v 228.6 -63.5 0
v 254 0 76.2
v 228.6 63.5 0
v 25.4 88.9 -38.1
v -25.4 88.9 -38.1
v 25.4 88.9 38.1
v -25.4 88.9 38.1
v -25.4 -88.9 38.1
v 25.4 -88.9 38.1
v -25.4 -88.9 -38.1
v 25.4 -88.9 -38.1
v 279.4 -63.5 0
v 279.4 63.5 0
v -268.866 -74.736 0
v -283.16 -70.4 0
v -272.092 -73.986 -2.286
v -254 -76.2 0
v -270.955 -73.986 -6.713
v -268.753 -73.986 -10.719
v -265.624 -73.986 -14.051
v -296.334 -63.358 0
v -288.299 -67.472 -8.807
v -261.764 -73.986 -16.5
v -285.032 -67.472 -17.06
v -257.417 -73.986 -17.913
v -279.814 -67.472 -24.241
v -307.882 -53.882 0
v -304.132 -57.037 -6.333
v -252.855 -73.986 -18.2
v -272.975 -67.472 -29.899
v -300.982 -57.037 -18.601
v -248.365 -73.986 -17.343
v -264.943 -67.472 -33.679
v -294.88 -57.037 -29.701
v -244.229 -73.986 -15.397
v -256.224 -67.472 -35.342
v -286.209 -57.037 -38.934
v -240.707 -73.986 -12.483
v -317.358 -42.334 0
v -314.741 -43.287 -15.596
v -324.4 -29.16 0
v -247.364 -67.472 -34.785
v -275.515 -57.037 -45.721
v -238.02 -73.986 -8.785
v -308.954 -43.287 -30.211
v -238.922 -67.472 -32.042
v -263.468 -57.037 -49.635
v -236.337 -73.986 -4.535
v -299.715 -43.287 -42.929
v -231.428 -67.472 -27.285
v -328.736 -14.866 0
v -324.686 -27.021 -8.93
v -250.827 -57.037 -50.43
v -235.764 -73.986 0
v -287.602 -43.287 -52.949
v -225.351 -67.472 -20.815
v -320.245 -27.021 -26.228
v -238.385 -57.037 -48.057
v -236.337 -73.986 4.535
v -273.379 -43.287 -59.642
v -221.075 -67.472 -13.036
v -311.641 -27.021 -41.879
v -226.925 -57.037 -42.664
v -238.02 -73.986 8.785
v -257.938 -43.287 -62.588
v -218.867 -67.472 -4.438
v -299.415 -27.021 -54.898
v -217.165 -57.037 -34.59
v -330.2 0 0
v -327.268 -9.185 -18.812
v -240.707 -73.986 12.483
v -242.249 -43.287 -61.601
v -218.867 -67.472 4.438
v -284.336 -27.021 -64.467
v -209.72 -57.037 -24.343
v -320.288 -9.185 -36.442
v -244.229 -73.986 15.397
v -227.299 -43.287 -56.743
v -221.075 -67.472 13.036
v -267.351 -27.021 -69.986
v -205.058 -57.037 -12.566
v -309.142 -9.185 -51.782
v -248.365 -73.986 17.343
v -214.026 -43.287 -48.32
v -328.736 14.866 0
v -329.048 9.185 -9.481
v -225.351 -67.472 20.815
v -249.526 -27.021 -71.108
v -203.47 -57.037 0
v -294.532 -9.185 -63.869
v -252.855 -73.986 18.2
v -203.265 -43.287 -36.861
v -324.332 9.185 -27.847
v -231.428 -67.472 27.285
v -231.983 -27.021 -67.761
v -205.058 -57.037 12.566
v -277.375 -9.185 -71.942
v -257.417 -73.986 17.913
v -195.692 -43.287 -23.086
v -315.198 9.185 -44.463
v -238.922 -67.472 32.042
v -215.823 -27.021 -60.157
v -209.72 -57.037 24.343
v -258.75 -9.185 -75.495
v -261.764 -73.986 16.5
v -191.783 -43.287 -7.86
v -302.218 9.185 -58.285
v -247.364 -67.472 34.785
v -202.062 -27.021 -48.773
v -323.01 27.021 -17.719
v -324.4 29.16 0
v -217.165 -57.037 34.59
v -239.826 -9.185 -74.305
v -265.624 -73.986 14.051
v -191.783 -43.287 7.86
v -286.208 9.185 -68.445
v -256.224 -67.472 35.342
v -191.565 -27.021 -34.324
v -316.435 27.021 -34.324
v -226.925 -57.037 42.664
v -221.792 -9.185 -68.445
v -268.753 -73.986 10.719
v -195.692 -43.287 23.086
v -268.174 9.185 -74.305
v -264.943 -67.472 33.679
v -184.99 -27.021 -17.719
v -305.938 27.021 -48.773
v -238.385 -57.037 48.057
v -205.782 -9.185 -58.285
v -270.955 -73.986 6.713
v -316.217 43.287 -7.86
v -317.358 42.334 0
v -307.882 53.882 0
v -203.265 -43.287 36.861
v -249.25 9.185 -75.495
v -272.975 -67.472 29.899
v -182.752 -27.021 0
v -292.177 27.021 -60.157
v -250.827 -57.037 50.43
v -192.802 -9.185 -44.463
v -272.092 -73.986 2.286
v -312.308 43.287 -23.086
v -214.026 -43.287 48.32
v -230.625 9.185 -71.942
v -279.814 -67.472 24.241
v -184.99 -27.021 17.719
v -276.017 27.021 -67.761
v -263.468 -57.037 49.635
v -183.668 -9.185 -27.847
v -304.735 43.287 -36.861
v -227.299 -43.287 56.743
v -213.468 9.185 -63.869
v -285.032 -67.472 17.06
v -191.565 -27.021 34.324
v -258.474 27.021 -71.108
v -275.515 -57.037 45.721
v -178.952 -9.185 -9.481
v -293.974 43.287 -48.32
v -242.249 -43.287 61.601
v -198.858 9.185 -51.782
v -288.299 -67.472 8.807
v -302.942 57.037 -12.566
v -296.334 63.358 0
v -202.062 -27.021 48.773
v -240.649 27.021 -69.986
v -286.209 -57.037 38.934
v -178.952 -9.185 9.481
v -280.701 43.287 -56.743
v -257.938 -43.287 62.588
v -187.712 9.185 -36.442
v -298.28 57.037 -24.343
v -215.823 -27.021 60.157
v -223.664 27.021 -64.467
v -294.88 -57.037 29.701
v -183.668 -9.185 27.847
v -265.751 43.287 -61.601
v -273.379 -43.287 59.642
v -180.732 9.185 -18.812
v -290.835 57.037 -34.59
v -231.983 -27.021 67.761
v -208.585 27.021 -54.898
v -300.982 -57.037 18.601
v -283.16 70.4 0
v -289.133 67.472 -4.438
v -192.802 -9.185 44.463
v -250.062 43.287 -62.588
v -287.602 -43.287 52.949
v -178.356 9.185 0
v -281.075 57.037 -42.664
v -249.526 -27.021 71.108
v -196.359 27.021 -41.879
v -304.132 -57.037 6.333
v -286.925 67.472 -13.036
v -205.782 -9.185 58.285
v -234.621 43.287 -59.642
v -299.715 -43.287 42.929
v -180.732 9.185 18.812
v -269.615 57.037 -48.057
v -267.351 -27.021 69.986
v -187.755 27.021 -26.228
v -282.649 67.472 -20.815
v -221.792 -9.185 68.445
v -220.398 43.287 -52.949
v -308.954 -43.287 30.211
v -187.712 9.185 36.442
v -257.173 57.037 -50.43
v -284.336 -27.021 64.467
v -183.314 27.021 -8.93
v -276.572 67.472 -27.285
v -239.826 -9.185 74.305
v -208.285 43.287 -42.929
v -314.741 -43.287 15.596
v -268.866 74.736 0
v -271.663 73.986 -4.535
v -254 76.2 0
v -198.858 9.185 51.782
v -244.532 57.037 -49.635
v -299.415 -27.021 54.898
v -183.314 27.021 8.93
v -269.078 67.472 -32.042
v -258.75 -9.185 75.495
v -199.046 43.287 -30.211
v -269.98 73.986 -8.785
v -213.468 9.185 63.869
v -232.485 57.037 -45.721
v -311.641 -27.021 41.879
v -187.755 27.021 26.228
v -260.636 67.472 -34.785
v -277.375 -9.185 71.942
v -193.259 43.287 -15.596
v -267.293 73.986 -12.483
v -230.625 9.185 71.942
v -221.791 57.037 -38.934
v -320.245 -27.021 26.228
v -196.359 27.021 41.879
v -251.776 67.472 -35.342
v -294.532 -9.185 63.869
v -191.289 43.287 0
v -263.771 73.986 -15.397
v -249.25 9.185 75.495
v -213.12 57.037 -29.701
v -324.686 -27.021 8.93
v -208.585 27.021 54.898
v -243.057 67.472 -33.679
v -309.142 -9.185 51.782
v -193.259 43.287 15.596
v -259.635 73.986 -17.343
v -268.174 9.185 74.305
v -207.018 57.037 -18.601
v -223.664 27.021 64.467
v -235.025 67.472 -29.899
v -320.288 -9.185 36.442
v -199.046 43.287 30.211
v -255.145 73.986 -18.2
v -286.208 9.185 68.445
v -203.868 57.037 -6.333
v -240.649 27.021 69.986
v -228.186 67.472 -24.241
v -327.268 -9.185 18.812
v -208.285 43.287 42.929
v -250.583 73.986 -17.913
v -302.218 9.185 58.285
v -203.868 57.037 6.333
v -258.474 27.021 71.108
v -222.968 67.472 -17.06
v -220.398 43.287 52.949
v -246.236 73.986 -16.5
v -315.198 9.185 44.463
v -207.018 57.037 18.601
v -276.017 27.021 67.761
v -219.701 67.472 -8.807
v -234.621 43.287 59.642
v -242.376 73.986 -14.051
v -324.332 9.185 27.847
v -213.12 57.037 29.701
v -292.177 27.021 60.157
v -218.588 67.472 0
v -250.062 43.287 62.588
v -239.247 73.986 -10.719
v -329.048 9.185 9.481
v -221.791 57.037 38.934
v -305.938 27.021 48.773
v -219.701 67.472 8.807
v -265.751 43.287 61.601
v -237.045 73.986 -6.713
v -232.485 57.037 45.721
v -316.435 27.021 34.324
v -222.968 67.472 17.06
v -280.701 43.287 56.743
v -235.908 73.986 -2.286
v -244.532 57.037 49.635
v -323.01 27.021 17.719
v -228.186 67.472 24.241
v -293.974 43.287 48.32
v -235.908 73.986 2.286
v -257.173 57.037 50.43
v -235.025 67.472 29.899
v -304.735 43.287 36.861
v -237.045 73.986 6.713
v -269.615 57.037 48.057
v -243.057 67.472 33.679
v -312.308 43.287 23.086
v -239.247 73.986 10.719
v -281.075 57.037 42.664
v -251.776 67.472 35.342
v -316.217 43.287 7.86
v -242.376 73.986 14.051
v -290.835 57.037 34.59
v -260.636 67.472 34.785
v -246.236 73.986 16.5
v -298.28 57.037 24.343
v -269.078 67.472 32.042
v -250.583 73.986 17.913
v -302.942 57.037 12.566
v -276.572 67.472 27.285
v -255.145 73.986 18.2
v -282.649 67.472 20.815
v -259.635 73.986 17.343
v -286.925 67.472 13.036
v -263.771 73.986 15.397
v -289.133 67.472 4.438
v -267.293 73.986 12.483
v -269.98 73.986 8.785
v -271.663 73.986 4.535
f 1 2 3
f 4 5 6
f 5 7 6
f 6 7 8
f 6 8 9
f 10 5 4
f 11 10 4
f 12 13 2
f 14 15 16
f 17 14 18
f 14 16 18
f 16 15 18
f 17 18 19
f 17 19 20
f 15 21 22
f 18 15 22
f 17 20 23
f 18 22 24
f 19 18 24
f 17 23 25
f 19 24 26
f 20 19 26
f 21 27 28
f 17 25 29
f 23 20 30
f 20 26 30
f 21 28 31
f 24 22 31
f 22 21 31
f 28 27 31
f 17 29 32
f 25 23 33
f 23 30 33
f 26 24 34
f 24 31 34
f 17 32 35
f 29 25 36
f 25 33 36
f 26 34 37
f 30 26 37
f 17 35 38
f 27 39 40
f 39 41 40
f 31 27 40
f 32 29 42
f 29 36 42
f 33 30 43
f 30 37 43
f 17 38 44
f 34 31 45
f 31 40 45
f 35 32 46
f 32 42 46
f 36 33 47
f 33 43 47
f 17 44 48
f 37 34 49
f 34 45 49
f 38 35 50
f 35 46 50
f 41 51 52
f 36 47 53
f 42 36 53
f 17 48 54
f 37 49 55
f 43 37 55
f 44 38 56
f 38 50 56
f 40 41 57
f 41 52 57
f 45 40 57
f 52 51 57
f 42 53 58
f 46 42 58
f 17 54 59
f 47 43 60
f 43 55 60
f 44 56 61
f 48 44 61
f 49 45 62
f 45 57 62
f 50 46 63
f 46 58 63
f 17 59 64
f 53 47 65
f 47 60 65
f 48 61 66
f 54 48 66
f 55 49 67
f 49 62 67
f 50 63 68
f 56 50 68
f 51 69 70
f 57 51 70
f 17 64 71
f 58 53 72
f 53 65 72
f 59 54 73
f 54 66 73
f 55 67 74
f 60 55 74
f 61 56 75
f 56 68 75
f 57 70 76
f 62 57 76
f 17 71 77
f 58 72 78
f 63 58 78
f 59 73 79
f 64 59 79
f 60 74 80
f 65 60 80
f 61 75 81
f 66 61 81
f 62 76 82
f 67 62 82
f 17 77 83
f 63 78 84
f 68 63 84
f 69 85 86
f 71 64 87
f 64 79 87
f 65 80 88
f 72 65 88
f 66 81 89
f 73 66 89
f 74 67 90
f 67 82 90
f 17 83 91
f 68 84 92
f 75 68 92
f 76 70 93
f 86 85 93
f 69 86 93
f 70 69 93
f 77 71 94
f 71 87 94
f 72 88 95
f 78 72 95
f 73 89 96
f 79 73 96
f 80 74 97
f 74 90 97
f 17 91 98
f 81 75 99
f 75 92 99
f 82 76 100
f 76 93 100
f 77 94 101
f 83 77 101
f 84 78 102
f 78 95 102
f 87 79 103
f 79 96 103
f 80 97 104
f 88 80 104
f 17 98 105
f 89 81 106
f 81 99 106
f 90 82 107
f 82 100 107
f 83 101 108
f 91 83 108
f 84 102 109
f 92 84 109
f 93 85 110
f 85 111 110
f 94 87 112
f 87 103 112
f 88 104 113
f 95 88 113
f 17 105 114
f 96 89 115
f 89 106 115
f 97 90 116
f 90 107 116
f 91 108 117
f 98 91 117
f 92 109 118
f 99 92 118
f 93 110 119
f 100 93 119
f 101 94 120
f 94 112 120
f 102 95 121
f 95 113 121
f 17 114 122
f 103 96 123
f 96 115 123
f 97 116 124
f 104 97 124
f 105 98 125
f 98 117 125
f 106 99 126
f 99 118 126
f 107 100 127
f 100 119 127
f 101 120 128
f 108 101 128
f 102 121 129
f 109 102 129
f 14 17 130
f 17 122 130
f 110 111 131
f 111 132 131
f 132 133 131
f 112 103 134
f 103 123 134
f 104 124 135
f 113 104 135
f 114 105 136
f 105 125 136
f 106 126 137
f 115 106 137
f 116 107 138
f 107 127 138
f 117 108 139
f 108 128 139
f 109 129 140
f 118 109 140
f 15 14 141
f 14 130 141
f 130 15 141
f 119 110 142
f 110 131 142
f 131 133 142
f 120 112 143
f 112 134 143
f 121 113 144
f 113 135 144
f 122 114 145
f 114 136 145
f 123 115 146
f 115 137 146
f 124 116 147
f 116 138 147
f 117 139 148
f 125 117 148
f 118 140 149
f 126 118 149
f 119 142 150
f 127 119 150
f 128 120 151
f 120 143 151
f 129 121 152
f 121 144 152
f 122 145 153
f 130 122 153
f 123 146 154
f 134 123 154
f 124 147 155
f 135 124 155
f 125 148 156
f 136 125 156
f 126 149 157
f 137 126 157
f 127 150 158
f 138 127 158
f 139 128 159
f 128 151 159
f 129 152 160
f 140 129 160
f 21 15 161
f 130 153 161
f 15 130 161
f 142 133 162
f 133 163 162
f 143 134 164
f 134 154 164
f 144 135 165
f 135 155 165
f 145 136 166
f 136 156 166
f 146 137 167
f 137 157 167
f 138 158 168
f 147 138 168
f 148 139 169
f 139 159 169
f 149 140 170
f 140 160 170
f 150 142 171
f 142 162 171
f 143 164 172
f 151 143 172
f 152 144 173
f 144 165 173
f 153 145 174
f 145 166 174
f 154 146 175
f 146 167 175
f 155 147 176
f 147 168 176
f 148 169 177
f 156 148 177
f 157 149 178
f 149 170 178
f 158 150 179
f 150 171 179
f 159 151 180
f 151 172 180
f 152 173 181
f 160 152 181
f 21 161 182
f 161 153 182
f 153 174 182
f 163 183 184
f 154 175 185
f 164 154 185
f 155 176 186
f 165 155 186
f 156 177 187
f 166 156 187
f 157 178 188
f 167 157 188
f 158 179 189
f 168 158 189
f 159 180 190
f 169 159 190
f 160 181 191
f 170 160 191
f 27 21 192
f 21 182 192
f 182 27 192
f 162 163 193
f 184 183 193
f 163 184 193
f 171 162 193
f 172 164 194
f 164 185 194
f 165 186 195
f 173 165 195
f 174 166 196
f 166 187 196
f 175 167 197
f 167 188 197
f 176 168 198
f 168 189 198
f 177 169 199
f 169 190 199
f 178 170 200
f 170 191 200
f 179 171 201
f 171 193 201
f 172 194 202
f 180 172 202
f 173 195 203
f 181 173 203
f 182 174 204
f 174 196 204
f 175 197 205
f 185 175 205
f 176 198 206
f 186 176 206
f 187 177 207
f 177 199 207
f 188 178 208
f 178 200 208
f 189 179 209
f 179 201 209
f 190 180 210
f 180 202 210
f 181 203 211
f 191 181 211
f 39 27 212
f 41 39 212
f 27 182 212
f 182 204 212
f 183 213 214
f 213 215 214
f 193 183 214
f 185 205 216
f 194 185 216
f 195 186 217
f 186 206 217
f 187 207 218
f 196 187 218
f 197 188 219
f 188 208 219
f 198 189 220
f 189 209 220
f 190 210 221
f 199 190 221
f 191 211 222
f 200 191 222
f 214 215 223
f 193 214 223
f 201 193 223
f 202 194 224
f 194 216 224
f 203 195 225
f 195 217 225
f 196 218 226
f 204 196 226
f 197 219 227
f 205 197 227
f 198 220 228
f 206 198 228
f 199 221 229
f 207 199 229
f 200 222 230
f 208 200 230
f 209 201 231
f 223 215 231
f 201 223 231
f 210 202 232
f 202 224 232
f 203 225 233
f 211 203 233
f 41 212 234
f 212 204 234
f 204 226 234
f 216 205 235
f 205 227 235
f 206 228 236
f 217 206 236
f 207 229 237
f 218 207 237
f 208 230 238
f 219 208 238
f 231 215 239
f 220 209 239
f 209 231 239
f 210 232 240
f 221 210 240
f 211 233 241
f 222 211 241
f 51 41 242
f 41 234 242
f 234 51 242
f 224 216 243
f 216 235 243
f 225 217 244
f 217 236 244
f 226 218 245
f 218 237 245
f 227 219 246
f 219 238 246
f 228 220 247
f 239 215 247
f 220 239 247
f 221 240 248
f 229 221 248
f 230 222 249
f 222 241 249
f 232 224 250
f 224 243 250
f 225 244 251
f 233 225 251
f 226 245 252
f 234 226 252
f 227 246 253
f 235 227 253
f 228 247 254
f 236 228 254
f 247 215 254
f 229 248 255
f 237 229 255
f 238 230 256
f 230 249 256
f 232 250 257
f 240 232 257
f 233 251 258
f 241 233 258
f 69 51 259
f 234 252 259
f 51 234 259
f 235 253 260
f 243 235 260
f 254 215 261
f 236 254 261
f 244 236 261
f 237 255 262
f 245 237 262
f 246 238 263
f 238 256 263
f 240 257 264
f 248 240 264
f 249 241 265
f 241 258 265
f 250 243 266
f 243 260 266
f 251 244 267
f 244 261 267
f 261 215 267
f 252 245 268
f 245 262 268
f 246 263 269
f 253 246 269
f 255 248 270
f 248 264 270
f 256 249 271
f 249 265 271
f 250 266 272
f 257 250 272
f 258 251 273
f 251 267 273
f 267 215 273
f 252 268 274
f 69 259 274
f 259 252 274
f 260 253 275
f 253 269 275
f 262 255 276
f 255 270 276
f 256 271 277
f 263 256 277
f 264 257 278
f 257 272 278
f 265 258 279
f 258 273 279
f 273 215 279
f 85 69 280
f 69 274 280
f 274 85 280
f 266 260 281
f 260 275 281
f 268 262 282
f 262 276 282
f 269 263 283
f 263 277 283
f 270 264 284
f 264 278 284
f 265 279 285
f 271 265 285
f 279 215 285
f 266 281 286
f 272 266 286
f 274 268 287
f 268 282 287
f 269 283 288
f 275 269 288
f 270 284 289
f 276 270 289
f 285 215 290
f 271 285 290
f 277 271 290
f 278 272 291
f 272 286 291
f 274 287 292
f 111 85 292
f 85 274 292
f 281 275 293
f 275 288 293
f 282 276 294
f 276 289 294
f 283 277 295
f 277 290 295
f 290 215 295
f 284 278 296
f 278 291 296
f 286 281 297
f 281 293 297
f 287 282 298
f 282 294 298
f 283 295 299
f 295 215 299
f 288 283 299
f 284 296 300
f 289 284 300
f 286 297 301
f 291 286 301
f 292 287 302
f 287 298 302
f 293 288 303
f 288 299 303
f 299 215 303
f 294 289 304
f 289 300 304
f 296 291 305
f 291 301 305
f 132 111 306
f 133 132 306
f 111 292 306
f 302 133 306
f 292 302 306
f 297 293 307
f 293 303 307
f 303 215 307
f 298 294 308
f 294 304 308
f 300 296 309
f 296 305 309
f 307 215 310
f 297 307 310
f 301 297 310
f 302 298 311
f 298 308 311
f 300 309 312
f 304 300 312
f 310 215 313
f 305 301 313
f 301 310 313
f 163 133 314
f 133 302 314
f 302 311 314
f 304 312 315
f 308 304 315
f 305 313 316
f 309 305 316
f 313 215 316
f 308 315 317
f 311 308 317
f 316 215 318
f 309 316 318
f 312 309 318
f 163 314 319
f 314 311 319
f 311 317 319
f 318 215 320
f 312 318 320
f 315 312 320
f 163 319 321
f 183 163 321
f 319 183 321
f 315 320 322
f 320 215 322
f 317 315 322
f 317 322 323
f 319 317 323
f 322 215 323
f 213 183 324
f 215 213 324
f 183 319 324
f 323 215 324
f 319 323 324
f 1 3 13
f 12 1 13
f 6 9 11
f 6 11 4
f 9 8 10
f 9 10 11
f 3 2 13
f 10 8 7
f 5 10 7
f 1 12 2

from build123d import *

# Parameters (mm, degrees)
SKETCH1_W                       = 50.8
SKETCH1_H                       = 177.8
RECPRISM_DEPTH                  = 38.1
PYRAMIDBASE_W                   = 50.8
PYRAMIDBASE_H                   = 127
PYRAMID_DEPTH                   = 76.2
SKETCH5_OUTSIDE_W               = 380.984
SKETCH5_OUTSIDE_H               = 190.484
CUT_EXTRUDE_PYRAMIDY_DEPTH      = 89.9
CUT_EXTRUDE_PYRAMIDY_DEPTH_BACK = 89.9
SKETCH6_OUTSIDE_W               = 190.484
SKETCH6_OUTSIDE_H               = 253.984
CUT_EXTRUDE_PYRAMIDX_DEPTH      = 26.4
CUT_EXTRUDE_PYRAMIDX_DEPTH_BACK = 280.4


with BuildPart() as part:
    # Sketch1 → RecPrism (new body, symmetric)
    with BuildSketch(Plane.XY):
        Rectangle(SKETCH1_W, SKETCH1_H)
    extrude(amount=RECPRISM_DEPTH, both=True)


with BuildPart() as body_2:
    # PyramidBase → Pyramid (new body)
    with BuildSketch(Plane.XY):
        with Locations((254, 0)):
            Rectangle(PYRAMIDBASE_W, PYRAMIDBASE_H)
    extrude(amount=PYRAMID_DEPTH)

    # Sketch5 outside → Cut-Extrude_PyramidY (cut, two sides)
    with BuildSketch(Plane(origin=(0, 0, 0), x_dir=(1, 0, 0), z_dir=(0, 1, 0))) as cut_extrude_pyramidy_sk:
        with Locations((127, -19.05)):
            Rectangle(SKETCH5_OUTSIDE_W, SKETCH5_OUTSIDE_H)
        Polygon((279.4, 0), (254, -76.2), (228.6, 0), align=None, mode=Mode.SUBTRACT)
    extrude(amount=CUT_EXTRUDE_PYRAMIDY_DEPTH, mode=Mode.SUBTRACT)
    extrude(cut_extrude_pyramidy_sk.sketch, amount=-CUT_EXTRUDE_PYRAMIDY_DEPTH_BACK, mode=Mode.SUBTRACT)

    # Sketch6 outside → Cut-Extrude_PyramidX (cut, two sides)
    with BuildSketch(Plane(origin=(254, 0, 0), x_dir=(0, 0, -1), z_dir=(1, 0, 0))) as cut_extrude_pyramidx_sk:
        with Locations((-19.05, 0)):
            Rectangle(SKETCH6_OUTSIDE_W, SKETCH6_OUTSIDE_H)
        Polygon((-76.2, 0), (0, 63.5), (0, -63.5), align=None, mode=Mode.SUBTRACT)
    extrude(amount=CUT_EXTRUDE_PYRAMIDX_DEPTH, mode=Mode.SUBTRACT)
    extrude(cut_extrude_pyramidx_sk.sketch, amount=-CUT_EXTRUDE_PYRAMIDX_DEPTH_BACK, mode=Mode.SUBTRACT)


with BuildPart() as body_3:
    # Sphere → SphereRevolve (revolve)
    with BuildSketch(Plane.XY):
        with BuildLine():
            Line((-254, 76.2), (-254, 0))
            Line((-254, 0), (-254, -76.2))
            ThreePointArc((-254, -76.2), (-330.2, 0), (-254, 76.2))
        make_face()
    revolve(axis=Axis((-254, 76.2, 0), (0, -1, 0)))


solid = Compound([part.part, body_2.part, body_3.part])
